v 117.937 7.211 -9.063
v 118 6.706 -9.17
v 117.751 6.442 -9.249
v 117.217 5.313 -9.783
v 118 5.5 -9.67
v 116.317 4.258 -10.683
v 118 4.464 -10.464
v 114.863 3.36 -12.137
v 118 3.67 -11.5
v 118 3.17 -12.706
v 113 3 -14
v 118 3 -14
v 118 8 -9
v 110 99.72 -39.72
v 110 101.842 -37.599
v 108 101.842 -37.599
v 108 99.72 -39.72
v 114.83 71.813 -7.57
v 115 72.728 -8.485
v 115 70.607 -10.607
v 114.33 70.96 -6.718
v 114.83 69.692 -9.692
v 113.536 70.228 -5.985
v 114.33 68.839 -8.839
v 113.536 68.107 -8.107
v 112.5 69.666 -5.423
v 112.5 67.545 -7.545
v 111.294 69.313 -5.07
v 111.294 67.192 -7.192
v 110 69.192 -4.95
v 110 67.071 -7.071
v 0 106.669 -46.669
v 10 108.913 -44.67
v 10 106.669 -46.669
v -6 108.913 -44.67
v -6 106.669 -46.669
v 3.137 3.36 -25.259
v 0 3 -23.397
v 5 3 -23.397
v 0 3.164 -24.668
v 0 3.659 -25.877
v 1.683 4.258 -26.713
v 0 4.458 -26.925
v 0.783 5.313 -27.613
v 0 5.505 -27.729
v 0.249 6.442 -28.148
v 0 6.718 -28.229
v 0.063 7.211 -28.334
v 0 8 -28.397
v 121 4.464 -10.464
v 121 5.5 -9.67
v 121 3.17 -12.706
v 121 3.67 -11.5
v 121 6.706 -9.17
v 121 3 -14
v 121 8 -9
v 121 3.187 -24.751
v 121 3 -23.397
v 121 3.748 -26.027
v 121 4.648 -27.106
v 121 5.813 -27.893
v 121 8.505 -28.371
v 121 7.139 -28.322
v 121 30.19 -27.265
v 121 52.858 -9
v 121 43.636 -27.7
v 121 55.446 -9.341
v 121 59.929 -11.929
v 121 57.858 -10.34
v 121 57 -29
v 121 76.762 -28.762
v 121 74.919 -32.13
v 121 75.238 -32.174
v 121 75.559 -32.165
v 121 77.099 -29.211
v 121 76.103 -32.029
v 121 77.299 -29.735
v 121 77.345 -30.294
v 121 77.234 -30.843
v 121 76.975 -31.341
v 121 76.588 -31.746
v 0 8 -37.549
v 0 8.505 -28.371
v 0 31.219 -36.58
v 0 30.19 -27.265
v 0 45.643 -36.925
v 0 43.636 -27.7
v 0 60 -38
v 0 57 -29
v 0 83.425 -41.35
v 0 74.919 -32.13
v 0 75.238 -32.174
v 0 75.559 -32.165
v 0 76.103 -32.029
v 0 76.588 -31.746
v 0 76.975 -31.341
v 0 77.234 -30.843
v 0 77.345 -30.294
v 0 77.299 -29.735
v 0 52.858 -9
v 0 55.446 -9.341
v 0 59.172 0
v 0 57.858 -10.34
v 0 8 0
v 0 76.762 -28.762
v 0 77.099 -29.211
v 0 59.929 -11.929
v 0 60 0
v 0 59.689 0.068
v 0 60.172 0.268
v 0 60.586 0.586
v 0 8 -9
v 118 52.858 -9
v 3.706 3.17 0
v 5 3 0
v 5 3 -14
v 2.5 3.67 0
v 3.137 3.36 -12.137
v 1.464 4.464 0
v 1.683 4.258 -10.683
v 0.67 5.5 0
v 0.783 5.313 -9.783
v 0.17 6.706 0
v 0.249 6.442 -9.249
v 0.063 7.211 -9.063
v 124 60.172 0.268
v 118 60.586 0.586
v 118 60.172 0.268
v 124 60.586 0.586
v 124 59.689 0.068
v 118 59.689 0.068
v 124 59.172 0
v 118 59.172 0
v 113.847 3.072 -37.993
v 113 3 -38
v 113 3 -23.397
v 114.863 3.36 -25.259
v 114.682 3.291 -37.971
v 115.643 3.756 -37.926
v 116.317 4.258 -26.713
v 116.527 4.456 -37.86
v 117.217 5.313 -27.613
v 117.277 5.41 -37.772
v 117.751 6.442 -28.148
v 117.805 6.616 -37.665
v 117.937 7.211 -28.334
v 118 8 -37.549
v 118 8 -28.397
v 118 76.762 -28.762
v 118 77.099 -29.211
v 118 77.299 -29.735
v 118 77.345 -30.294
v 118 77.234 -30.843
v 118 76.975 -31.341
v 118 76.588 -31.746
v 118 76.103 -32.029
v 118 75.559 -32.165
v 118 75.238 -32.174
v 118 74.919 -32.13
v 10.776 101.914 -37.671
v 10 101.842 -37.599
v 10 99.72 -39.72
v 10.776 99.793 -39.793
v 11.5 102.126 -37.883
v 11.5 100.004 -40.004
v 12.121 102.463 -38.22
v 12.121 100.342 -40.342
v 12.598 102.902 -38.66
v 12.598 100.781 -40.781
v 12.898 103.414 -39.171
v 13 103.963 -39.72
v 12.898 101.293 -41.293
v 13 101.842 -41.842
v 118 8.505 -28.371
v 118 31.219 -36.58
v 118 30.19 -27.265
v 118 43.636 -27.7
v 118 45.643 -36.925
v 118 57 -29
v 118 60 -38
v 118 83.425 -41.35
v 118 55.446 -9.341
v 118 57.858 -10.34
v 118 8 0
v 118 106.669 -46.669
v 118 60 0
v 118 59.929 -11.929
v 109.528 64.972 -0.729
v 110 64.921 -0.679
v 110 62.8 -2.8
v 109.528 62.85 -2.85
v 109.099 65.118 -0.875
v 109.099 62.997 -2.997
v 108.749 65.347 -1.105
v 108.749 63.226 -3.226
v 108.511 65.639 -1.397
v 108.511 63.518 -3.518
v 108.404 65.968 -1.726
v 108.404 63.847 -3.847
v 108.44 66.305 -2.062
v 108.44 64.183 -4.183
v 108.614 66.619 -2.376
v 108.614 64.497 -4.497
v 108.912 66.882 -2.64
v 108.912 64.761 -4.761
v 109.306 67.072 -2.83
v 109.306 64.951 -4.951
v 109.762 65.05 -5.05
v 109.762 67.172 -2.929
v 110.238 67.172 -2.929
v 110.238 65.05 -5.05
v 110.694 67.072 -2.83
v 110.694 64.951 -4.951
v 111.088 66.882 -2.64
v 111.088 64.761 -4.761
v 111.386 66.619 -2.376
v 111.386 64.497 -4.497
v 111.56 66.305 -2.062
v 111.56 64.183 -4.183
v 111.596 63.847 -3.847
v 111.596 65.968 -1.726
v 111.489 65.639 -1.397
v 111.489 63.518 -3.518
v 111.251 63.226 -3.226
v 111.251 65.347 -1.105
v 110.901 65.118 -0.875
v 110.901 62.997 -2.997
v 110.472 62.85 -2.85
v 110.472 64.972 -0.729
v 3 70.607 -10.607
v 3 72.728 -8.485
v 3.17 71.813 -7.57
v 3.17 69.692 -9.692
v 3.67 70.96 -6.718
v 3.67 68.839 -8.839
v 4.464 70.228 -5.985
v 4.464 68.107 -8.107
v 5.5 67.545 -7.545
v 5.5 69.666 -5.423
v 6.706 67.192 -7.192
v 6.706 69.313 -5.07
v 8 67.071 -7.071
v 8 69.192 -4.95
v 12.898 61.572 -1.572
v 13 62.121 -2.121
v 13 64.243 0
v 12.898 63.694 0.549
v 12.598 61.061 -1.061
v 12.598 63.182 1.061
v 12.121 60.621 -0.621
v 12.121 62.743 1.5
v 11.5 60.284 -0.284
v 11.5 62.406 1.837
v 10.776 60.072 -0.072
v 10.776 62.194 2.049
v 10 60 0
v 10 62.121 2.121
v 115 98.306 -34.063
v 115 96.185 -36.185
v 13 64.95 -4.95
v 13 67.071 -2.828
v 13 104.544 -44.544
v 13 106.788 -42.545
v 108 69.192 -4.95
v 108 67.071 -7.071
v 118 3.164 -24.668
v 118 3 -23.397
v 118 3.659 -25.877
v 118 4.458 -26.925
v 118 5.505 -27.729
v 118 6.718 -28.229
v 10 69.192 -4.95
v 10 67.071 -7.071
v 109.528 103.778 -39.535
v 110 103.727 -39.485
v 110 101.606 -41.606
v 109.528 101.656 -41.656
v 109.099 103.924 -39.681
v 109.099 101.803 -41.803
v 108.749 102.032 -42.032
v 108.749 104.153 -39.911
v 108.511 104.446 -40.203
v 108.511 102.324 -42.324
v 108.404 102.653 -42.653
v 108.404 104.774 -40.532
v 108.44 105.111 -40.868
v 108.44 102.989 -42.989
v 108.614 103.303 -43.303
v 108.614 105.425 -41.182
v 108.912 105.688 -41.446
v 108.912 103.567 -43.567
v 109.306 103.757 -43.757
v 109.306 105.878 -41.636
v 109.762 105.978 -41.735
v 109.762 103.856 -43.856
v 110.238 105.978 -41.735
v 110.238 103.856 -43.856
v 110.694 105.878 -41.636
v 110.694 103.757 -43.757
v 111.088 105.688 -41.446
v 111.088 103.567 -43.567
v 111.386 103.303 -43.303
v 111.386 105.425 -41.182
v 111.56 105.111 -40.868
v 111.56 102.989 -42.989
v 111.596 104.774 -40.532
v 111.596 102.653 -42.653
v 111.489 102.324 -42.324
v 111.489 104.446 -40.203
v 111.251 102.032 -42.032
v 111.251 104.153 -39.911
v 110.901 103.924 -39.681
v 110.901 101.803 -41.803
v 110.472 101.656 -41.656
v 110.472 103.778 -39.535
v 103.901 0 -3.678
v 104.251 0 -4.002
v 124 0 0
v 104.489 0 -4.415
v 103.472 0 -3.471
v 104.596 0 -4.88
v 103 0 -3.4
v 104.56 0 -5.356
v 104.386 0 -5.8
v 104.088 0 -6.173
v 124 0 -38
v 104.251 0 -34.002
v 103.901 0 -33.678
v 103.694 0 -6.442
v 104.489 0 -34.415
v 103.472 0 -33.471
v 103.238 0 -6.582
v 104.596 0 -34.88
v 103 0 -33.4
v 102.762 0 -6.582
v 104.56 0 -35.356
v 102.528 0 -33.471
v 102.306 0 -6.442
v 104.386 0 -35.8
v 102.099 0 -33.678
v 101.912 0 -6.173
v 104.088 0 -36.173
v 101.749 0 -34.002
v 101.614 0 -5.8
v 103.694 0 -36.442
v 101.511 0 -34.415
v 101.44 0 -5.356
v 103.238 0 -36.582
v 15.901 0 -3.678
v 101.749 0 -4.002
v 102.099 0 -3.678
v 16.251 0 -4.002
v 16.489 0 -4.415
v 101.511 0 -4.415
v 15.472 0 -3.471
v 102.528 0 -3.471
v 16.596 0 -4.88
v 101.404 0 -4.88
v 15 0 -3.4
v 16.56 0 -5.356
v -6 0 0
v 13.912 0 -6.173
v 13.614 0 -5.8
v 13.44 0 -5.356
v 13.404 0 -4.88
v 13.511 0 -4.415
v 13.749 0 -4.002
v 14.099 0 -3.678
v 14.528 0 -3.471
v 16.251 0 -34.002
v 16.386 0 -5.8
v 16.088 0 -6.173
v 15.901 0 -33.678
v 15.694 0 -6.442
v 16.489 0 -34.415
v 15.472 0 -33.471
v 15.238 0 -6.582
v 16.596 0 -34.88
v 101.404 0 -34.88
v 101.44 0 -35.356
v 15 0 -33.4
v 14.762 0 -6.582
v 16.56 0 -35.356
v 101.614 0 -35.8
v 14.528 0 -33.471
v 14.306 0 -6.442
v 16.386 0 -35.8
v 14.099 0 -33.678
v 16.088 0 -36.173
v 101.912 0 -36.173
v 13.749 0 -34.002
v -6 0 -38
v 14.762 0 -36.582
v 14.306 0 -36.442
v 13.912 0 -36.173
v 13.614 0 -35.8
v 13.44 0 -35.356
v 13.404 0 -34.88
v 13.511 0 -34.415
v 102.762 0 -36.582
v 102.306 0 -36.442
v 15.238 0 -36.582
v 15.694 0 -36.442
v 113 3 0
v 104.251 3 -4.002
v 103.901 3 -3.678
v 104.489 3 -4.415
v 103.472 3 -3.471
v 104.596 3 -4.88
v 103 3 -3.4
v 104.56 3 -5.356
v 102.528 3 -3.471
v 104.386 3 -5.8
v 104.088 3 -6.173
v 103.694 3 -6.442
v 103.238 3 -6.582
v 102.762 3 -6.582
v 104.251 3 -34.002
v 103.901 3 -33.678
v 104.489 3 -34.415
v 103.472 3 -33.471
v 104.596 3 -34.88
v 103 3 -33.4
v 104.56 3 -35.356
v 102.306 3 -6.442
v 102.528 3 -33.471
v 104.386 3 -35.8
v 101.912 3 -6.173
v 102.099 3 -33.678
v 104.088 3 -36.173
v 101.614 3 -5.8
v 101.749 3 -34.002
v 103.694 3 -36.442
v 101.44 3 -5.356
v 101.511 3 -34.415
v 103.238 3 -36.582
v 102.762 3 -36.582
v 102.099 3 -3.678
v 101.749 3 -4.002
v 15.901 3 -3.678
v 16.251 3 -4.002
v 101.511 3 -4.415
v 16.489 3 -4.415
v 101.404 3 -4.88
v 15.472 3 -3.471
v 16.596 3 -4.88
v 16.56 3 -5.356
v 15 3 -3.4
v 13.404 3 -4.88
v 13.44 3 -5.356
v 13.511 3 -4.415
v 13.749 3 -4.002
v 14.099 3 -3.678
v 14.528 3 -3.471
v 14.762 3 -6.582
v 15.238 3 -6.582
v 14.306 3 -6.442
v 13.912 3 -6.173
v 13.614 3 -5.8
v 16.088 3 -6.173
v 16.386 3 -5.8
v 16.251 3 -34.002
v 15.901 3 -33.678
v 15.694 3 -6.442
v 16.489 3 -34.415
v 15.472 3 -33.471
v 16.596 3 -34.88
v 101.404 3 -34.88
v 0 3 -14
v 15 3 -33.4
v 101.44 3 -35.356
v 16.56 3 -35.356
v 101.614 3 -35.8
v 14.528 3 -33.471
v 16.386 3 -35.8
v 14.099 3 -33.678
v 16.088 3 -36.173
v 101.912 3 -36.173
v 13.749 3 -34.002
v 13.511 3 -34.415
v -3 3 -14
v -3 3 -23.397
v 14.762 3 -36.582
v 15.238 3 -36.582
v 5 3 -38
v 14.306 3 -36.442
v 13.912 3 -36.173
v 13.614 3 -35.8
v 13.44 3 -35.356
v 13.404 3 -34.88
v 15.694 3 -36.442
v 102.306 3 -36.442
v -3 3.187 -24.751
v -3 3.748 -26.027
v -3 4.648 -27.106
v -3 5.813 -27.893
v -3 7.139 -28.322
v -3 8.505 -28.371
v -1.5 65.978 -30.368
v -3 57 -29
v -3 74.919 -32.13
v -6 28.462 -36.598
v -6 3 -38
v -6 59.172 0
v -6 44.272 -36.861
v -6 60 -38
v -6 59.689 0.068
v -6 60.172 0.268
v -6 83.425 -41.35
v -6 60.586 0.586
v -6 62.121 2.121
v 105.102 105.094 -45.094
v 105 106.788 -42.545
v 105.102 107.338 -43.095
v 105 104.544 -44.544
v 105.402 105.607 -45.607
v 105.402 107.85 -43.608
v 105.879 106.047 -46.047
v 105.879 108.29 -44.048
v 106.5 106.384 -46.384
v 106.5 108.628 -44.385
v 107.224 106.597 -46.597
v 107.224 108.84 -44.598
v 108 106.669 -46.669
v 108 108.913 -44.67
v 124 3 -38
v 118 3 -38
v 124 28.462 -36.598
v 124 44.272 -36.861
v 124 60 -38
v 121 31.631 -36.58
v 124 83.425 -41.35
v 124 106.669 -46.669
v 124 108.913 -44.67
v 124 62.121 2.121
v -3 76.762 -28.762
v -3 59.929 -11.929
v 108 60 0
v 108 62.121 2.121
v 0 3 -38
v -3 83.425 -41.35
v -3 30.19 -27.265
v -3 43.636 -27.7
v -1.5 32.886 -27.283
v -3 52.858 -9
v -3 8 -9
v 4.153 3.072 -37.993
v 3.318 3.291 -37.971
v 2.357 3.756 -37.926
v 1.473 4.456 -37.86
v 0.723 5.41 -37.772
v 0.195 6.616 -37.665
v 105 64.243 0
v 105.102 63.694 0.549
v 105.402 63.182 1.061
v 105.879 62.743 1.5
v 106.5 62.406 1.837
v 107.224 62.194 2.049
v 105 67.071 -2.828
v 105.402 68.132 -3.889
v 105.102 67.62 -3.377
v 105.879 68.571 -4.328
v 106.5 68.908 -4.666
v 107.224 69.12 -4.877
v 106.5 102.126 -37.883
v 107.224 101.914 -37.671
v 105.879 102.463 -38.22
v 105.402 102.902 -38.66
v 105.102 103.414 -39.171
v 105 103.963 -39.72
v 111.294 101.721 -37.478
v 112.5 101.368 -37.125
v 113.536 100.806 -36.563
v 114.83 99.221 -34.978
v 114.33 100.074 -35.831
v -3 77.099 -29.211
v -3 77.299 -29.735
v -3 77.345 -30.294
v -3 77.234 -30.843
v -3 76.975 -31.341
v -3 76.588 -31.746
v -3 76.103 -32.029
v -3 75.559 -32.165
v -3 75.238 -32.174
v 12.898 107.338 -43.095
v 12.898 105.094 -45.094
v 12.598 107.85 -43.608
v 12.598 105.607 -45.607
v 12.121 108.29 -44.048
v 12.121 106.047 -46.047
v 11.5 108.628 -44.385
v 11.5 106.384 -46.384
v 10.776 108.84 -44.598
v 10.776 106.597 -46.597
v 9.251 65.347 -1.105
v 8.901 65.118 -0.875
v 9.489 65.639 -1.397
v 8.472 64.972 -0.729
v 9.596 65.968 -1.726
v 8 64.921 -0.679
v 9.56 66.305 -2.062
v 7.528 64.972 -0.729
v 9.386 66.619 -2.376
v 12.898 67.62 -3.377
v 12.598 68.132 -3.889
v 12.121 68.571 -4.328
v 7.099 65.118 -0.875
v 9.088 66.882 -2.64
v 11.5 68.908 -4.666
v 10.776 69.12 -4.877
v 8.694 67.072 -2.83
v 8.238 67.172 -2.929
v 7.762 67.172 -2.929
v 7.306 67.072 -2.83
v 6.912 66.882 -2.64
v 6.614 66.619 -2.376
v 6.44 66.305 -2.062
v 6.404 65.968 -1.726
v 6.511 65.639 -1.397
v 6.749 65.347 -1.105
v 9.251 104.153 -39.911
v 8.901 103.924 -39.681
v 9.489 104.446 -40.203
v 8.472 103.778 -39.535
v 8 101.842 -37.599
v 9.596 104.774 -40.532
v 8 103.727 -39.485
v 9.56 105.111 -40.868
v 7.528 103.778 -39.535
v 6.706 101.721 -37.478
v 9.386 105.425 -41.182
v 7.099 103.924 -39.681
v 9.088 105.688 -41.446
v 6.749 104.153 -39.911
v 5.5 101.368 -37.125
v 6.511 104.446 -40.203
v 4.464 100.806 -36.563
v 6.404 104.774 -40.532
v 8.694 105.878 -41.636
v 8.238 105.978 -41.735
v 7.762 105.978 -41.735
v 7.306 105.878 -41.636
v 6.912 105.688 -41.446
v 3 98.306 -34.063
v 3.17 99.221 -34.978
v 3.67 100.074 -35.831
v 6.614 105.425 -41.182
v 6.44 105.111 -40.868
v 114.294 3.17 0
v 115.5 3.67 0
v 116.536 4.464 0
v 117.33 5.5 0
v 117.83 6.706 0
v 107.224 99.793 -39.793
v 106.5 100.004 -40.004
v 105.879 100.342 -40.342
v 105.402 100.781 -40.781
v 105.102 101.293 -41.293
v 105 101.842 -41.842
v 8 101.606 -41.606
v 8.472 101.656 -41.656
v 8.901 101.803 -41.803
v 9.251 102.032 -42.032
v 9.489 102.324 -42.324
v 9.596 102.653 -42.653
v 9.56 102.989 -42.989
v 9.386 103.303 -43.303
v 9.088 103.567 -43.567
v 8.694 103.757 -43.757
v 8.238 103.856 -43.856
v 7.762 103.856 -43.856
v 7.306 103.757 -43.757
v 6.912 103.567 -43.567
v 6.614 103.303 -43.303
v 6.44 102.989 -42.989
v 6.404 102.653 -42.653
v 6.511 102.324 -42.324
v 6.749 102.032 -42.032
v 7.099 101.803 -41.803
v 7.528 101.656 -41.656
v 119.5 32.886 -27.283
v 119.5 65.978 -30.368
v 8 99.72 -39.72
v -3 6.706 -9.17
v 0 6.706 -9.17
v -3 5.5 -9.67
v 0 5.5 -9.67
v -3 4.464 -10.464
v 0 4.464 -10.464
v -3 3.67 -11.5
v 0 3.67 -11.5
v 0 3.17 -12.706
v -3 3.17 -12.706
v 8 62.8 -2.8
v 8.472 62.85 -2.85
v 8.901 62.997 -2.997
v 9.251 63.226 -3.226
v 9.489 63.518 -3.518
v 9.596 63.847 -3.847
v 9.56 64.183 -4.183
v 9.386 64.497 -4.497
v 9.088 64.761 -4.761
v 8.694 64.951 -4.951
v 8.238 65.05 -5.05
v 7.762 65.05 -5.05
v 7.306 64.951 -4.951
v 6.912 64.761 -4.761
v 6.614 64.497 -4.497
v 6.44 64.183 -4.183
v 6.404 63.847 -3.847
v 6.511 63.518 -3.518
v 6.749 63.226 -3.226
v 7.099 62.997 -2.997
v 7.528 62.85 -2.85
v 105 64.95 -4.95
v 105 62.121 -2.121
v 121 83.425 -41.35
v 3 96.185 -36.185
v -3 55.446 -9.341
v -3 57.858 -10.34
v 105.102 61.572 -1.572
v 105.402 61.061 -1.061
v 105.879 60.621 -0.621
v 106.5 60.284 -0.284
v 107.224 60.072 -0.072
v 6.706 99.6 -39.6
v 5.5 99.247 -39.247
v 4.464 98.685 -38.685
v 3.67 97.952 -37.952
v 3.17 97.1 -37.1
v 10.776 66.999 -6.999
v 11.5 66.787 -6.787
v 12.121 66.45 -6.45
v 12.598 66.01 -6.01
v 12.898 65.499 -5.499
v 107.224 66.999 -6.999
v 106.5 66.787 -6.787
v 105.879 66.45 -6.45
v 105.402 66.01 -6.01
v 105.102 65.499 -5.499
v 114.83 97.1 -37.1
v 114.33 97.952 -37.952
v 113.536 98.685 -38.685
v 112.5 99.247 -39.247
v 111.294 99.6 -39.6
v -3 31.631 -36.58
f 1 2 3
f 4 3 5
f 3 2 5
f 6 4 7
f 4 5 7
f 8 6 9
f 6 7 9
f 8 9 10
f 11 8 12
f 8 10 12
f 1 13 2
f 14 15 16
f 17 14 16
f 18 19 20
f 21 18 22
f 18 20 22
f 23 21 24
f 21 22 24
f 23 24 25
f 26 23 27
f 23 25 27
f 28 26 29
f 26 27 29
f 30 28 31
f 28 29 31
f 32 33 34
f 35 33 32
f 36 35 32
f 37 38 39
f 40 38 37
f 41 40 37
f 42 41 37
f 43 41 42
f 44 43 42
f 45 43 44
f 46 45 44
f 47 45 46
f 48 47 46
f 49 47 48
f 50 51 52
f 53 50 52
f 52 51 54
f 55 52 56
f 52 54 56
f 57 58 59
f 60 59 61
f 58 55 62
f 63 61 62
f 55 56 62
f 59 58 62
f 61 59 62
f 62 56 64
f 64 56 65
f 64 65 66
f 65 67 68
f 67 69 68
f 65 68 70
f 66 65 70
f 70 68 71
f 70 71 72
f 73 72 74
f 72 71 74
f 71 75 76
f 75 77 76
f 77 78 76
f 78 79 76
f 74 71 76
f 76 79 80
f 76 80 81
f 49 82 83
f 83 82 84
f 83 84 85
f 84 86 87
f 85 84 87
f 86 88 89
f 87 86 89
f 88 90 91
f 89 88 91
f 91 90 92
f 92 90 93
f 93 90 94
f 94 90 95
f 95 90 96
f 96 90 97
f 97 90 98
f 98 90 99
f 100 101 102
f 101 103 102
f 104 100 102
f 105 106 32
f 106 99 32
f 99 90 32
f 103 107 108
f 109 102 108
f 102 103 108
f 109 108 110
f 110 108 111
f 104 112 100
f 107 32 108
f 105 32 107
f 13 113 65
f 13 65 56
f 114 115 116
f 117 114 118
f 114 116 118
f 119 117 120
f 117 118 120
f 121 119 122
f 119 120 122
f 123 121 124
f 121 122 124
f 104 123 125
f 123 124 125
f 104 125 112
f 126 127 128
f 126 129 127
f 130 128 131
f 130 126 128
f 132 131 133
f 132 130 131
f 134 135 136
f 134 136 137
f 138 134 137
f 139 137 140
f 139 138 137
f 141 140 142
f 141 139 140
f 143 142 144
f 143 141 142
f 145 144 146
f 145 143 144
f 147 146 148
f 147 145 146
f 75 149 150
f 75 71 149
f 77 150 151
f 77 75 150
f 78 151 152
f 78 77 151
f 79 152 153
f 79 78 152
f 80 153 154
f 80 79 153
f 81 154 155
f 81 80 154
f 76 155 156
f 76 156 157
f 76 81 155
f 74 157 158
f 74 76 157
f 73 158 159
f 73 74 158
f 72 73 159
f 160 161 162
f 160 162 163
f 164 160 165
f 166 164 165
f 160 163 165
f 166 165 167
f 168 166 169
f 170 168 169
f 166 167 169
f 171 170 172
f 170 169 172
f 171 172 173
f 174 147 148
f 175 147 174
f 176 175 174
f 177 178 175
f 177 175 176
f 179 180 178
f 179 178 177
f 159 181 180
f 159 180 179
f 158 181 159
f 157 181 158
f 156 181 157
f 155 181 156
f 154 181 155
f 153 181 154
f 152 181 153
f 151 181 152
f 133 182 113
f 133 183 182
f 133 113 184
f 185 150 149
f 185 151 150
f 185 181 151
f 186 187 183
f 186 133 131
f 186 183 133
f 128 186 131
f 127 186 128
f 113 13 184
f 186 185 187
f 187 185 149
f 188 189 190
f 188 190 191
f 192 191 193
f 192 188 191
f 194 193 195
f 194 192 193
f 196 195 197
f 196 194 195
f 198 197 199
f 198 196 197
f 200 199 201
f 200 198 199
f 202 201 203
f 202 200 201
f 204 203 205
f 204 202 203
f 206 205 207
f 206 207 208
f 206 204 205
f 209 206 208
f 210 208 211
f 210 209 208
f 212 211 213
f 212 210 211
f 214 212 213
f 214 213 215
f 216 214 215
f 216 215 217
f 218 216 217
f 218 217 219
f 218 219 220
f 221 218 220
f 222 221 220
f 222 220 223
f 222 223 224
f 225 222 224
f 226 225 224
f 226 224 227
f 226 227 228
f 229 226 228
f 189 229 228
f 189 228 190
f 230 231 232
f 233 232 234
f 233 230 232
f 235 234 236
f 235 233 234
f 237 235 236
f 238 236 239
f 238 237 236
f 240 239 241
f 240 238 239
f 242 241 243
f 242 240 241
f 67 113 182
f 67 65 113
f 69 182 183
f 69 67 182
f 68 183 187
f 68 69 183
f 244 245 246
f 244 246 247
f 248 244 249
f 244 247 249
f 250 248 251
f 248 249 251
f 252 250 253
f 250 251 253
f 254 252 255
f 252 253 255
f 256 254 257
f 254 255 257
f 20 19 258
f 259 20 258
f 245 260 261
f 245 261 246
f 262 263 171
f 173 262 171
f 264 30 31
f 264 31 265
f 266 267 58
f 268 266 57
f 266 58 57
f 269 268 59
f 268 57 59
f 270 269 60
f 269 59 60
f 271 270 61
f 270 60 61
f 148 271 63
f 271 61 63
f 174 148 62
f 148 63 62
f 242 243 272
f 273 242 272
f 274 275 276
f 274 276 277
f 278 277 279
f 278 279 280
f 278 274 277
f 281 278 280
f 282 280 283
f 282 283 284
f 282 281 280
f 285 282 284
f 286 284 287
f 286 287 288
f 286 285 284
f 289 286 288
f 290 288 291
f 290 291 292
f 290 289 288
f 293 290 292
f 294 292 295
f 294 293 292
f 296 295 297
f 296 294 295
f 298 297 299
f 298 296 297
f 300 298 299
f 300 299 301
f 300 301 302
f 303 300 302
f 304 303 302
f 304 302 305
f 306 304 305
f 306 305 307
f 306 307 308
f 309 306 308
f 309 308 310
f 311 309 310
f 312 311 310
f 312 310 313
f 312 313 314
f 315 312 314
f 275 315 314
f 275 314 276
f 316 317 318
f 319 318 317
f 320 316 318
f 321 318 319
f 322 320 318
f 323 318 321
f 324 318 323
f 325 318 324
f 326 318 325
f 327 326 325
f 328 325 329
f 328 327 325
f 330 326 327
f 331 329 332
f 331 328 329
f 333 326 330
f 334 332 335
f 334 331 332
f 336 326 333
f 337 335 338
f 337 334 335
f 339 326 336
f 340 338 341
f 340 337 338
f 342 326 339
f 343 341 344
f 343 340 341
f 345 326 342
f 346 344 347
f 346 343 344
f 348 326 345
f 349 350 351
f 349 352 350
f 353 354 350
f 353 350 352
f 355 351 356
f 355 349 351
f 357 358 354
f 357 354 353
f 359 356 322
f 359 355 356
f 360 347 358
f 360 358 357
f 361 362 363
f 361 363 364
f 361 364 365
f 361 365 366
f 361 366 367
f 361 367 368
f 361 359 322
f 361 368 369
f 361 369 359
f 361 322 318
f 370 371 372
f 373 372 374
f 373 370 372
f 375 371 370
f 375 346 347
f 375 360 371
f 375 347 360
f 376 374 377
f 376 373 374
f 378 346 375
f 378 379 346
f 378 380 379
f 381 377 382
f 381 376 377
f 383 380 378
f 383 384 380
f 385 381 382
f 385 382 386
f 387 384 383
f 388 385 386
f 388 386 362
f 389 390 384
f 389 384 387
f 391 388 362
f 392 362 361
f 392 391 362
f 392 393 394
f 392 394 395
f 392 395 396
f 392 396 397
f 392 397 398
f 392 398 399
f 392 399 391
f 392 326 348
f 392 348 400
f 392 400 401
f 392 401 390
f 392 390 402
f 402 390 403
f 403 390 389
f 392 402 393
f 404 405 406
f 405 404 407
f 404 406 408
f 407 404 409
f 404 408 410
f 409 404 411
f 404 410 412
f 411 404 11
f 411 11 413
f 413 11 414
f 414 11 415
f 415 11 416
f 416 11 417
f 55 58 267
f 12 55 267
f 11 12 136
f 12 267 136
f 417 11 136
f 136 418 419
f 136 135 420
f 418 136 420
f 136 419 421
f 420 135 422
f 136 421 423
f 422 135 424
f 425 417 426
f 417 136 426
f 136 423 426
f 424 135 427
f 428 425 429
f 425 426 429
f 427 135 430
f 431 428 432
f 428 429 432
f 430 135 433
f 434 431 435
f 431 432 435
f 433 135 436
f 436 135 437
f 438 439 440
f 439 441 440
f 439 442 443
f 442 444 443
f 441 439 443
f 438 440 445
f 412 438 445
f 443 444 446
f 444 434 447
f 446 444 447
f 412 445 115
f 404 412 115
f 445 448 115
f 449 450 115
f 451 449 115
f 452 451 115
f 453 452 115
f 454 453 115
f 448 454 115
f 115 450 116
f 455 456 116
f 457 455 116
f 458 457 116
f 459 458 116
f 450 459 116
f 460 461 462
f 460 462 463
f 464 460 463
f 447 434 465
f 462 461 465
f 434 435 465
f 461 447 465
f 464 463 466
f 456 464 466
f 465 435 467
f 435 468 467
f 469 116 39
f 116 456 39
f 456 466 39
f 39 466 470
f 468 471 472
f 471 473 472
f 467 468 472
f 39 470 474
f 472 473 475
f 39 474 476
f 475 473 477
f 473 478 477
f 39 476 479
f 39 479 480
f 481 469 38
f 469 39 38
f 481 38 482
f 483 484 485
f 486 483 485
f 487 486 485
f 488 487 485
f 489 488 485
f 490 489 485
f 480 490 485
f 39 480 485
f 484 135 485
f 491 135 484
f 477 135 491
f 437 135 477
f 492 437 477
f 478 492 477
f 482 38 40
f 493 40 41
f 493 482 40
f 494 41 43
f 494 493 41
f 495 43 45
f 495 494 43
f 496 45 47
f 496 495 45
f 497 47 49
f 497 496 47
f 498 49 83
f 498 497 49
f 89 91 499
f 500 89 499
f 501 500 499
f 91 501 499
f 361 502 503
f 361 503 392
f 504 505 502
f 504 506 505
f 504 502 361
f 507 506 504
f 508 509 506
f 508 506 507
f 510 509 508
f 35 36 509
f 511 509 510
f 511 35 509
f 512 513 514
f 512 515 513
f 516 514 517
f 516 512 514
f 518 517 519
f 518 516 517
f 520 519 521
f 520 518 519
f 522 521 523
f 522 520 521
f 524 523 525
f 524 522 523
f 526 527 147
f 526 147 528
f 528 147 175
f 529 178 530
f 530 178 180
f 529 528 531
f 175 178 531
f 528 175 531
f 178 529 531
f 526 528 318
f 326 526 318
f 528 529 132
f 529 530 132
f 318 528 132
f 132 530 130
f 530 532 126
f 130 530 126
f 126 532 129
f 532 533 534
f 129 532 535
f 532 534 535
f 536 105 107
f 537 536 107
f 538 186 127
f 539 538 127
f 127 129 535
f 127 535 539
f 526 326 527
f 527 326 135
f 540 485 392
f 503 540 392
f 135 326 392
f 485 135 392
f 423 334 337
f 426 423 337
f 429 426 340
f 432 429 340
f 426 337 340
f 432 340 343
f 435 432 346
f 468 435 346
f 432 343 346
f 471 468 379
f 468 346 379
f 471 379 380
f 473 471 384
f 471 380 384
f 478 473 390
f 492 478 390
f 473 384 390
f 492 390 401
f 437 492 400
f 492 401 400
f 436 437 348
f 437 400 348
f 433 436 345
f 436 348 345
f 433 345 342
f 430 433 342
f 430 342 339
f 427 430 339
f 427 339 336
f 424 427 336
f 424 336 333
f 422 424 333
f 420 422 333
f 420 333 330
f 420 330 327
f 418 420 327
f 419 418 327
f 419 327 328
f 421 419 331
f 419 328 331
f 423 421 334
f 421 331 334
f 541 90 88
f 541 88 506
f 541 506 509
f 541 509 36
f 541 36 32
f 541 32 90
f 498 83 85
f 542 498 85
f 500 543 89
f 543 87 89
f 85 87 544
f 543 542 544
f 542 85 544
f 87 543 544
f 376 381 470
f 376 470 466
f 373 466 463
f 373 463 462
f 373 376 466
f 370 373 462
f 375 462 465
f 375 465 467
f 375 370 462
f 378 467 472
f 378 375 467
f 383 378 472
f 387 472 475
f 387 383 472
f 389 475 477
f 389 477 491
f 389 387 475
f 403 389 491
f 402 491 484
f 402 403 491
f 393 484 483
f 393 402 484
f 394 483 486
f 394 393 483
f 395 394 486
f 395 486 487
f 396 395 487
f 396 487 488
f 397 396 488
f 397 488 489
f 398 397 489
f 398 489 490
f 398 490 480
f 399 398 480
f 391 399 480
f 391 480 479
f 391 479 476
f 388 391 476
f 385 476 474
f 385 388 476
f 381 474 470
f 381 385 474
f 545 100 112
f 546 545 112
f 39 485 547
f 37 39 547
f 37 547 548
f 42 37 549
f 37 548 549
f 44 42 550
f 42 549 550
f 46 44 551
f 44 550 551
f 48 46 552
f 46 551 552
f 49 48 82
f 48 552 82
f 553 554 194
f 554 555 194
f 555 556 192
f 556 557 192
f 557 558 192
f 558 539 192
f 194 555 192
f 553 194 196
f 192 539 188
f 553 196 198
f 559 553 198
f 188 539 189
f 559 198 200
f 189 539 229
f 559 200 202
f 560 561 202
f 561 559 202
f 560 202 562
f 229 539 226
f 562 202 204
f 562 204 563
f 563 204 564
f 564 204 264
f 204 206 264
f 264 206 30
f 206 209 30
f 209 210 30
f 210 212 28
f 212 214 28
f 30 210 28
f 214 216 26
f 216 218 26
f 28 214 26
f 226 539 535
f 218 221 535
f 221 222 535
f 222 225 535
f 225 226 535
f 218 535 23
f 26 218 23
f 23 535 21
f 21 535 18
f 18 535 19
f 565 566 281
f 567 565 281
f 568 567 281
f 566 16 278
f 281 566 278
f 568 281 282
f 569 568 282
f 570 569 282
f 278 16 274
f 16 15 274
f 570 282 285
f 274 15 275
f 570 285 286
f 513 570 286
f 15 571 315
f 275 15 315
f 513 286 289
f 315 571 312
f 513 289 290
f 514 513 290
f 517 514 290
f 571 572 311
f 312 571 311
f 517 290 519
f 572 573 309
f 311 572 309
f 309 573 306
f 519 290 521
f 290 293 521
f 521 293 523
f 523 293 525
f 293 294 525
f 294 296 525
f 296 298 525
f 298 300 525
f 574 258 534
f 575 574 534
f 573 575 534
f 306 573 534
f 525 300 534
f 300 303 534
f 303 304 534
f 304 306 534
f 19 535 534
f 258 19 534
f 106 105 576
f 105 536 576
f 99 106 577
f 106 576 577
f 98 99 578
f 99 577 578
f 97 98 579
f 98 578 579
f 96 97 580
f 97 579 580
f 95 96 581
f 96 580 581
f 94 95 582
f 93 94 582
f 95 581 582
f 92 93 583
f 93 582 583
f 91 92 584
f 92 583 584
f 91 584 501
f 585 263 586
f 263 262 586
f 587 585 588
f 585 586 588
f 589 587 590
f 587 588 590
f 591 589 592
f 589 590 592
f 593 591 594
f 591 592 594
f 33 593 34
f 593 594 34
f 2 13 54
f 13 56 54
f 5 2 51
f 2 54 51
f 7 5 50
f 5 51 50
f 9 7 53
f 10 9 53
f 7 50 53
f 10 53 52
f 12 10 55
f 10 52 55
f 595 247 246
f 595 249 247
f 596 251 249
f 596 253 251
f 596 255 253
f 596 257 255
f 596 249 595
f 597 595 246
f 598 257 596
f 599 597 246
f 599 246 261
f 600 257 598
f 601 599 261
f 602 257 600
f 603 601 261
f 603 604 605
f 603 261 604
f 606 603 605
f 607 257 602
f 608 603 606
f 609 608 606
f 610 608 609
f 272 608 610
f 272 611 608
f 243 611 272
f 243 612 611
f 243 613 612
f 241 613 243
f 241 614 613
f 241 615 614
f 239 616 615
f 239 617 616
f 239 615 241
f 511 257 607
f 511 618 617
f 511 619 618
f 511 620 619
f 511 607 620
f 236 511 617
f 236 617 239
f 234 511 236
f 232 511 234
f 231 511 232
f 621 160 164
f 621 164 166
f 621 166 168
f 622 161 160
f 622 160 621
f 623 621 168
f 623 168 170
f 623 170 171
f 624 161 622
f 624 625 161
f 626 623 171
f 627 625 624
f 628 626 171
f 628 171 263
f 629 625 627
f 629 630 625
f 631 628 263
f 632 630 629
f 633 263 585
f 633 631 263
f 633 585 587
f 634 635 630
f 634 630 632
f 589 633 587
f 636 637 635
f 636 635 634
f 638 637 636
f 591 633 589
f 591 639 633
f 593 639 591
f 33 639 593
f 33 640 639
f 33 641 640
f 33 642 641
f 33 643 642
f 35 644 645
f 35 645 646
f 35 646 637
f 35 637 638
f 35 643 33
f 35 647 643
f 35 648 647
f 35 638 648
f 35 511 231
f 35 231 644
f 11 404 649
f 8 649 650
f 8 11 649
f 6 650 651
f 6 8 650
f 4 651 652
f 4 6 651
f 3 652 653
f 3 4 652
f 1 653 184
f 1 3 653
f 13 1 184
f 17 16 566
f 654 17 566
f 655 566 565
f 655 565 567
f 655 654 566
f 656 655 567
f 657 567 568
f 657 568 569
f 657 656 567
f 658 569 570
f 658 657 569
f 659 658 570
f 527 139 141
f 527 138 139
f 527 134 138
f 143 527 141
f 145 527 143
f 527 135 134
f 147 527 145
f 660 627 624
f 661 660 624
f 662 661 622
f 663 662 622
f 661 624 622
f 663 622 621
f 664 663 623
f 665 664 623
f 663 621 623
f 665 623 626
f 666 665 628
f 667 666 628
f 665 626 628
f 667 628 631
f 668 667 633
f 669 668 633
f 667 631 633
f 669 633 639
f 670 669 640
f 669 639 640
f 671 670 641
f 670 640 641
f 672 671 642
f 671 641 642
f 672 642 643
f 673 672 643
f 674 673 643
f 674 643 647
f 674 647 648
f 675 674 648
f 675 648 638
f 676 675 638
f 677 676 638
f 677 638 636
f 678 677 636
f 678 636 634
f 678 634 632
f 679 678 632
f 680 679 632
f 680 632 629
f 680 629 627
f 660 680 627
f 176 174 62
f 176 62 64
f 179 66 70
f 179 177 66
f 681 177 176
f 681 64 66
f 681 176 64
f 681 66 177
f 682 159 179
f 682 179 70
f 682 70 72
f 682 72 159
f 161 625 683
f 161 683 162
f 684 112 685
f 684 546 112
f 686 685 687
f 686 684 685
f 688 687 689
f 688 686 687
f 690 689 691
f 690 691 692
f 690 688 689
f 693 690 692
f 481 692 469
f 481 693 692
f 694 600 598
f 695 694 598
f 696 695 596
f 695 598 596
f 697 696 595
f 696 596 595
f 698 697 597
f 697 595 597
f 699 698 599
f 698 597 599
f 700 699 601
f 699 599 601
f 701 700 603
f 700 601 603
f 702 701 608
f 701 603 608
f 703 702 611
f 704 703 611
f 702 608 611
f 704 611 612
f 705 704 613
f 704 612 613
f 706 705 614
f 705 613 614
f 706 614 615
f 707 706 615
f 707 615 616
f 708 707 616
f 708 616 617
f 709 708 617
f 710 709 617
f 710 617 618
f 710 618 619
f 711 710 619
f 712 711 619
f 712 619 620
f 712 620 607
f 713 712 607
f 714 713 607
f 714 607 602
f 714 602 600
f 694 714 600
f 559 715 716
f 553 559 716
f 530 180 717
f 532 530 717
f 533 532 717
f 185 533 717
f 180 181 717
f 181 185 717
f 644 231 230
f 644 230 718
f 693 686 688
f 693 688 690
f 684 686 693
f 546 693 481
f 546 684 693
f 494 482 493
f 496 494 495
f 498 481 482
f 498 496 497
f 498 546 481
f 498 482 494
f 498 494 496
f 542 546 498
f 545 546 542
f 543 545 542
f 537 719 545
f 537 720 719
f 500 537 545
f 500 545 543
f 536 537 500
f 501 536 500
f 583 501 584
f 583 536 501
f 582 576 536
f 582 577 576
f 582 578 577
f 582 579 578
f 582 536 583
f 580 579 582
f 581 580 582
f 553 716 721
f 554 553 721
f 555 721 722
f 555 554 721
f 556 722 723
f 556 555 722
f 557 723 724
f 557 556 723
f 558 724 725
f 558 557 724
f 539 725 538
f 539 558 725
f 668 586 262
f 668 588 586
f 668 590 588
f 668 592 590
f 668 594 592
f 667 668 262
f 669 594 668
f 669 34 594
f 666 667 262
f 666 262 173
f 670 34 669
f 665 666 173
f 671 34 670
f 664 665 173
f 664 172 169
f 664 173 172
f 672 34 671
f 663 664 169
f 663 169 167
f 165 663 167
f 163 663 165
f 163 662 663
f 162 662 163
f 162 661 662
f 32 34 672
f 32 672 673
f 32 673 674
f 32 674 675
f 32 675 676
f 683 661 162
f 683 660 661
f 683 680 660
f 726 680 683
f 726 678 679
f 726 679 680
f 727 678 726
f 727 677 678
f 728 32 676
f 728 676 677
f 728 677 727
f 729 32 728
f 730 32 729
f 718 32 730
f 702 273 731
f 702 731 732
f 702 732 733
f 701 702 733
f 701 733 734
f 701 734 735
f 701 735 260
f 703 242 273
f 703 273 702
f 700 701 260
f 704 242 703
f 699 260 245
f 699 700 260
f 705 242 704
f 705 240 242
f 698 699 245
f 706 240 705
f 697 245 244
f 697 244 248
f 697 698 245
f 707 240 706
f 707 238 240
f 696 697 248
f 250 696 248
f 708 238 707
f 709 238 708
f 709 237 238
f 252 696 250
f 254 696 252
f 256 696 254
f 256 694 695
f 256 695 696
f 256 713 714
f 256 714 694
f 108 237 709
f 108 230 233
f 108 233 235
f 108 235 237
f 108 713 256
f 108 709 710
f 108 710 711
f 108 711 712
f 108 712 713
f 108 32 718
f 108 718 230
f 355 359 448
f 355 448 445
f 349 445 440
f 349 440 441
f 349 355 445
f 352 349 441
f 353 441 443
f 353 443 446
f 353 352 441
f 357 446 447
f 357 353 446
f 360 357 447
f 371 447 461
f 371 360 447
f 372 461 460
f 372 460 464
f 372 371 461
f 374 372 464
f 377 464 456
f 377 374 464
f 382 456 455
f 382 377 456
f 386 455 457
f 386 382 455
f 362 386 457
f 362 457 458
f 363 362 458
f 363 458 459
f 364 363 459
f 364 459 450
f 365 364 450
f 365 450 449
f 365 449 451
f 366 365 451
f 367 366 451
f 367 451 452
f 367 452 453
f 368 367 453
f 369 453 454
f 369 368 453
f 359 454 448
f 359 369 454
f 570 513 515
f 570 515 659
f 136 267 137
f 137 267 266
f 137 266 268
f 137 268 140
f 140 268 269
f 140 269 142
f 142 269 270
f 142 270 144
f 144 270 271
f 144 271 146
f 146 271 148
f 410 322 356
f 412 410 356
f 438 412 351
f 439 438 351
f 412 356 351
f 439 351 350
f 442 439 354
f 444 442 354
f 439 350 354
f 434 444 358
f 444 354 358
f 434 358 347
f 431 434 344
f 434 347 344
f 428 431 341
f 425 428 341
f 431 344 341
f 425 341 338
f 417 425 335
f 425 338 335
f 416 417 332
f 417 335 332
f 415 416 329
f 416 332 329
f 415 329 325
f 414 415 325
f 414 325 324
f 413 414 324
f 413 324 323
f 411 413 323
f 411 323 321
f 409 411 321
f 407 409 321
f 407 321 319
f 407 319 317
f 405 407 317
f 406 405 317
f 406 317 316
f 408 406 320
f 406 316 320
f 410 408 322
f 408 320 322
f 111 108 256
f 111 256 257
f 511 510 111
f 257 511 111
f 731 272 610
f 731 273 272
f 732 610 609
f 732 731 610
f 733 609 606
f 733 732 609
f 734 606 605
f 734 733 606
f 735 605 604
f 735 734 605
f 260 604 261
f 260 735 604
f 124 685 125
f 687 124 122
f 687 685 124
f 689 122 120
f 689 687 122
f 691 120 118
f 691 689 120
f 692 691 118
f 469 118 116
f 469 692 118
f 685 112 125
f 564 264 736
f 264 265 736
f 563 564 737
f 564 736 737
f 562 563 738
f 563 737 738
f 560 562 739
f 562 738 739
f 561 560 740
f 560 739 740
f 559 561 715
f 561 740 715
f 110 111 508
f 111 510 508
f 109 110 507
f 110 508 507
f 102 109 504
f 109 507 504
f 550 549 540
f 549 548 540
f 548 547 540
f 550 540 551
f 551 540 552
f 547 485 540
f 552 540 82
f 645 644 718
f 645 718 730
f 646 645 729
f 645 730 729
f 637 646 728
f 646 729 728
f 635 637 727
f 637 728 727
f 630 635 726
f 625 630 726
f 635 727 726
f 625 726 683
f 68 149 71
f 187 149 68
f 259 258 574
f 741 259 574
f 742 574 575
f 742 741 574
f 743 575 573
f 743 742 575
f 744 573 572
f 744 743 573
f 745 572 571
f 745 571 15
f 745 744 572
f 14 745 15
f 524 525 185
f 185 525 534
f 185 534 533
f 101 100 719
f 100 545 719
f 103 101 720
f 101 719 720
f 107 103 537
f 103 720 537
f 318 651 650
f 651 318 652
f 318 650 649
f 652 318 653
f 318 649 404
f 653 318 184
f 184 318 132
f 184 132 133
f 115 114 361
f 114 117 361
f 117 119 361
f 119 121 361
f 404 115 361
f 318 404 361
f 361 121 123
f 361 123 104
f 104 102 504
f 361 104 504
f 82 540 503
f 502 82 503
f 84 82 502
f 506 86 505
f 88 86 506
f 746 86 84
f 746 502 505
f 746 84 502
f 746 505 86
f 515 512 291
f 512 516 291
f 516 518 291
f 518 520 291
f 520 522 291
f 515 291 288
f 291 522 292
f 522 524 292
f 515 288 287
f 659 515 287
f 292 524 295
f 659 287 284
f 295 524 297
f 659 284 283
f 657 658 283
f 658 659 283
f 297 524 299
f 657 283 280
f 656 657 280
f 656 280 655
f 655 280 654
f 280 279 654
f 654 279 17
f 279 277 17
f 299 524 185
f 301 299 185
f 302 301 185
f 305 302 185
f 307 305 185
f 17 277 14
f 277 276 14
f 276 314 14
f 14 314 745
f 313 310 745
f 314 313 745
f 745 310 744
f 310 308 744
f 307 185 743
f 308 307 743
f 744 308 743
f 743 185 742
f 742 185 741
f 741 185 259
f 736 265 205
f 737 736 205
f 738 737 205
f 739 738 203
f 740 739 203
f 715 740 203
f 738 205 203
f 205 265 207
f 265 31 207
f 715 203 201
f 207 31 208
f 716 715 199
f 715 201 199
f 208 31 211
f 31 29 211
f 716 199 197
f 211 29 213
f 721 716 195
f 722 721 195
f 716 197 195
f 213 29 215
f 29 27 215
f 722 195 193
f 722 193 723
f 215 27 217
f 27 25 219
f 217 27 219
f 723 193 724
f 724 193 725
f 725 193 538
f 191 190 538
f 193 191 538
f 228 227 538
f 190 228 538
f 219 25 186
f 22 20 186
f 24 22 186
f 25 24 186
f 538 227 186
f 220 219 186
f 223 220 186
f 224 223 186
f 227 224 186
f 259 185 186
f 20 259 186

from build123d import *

# Parameters (mm, degrees)
SKETCH_1_W          = 20
SKETCH_1_H          = 38
SKETCH_1_R          = 1.6
EXTRUDE_1_DEPTH     = 3
SKETCH_7_W          = 38
SKETCH_7_H          = 3
EXTRUDE_7_DEPTH     = 6
EXTRUDE_8_DEPTH     = 19
FILLET_1_R          = 2
SKETCH_10_R         = 1.6
CUT_EXTRUDE_3_DEPTH = 10
CUT_EXTRUDE_4_DEPTH = 3
SKETCH_13_W         = 10
SKETCH_13_H         = 46.172897719
CUT_EXTRUDE_5_DEPTH = 3
FILLET_3_R          = 10
FILLET_4_R          = 5
FILLET_5_R          = 2
FILLET_6_R          = 5
FILLET_7_R          = 5
FILLET_8_R          = 3
SKETCH_11_W         = 39
SKETCH_11_H         = 38
EXTRUDE_9_DEPTH     = 3
FILLET_START        = -37.531780157
FILLET_9_DEPTH      = 9.135274029
FILLET_START_2      = -9
FILLET_9_2_DEPTH    = 9
FILLET_START_3      = -38.0000001
FILLET_9_3_DEPTH    = 14.603493972
FILLET_START_4      = -14
FILLET_9_4_DEPTH    = 5
FILLET_9_5_DEPTH    = 5


with BuildPart() as part:
    # 草图1 → 凸台-拉伸1 (new body)
    with BuildSketch(Plane(origin=(0, 0, 0), x_dir=(1, 0, 0), z_dir=(0, 1, 0))):
        with Locations((10, 19)):
            Rectangle(SKETCH_1_W, SKETCH_1_H)
        with Locations(Location((15, 5, 0), (0, 0, 270))):
            Circle(SKETCH_1_R, mode=Mode.SUBTRACT)
        with Locations(Location((15, 35, 0), (0, 0, 270))):
            Circle(SKETCH_1_R, mode=Mode.SUBTRACT)
    extrude(amount=EXTRUDE_1_DEPTH)

    # 草图7 → 凸台-拉伸7 (add)
    with BuildSketch(Plane.ZY):
        with BuildLine():
            Line((-38, 3), (0, 3))
            Line((0, 3), (0, 60))
            Line((0, 60), (-38, 60))
            add(Edge.make_bspline(
                [(-38, 3), (-35.160021148, 31.761534368), (-38, 60)],
                knots=[0, 0, 0, 0.545624852, 0.545624852, 0.545624852], degree=2))
        make_face()
        with Locations((-19, 1.5)):
            Rectangle(SKETCH_7_W, SKETCH_7_H)
        with BuildLine():
            Line((-38, 60), (0, 60))
            Line((0, 60), (2.121320344, 62.121320344))
            Line((2.121320344, 62.121320344), (-44.669984364, 108.912625051))
            Line((-44.669984364, 108.912625051), (-46.669047558, 106.669047558))
            add(Edge.make_bspline(
                [(-38, 60), (-40.365023894, 83.51589552), (-46.669047558, 106.669047558)],
                knots=[0.545624852, 0.545624852, 0.545624852, 1, 1, 1], degree=2))
        make_face()
    extrude(amount=EXTRUDE_7_DEPTH)

    # 草图8 → 凸台-拉伸8 (add)
    with BuildSketch(Plane.ZY.offset(6)):
        Polygon((-44.669984364, 108.912625051), (-46.669047558, 106.669047558), (0, 60), (2.121320344, 62.121320344), align=None)
    extrude(amount=-EXTRUDE_8_DEPTH)

    # 圆角1
    fillet_1_edges = [part.edges().sort_by_distance(p)[0] for p in [
        (-3, 60, 0),
    ]]
    fillet(fillet_1_edges, radius=FILLET_1_R)

    # 草图10 → 切除-拉伸3 (cut)
    with BuildSketch(Plane(origin=(0, 32.121320344, 32.121320344), x_dir=(1, 0, 0), z_dir=(0, 0.7071067811865476, 0.7071067811865475))):
        with Locations(Location((8, 102.866406871, 0), (0, 0, 270))):
            Circle(SKETCH_10_R)
        with Locations(Location((8, 47.986406871, 0), (0, 0, 270))):
            Circle(SKETCH_10_R)
    extrude(amount=-CUT_EXTRUDE_3_DEPTH, mode=Mode.SUBTRACT)

    # 草图12 → 切除-拉伸4 (cut)
    with BuildSketch(Plane(origin=(0, 0, 0), x_dir=(0, 0, -1), z_dir=(1, 0, 0))):
        with BuildLine():
            Line((9, 57), (9, 3))
            Line((9, 3), (29, 3))
            add(Edge.make_bspline(
                [(29, 3), (25.530992691, 30.329804849), (29, 57)],
                knots=[0, 0, 0, 0.681816387, 0.681816387, 0.681816387], degree=2))
            Line((29, 57), (9, 57))
        make_face()
        with BuildLine():
            Line((33.748737342, 81.748737342), (9, 57))
            Line((9, 57), (29, 57))
            add(Edge.make_bspline(
                [(29, 57), (30.618883469, 69.446194026), (33.748737342, 81.748737342)],
                knots=[0.681816387, 0.681816387, 0.681816387, 1, 1, 1], degree=2))
        make_face()
    extrude(amount=-CUT_EXTRUDE_4_DEPTH, mode=Mode.SUBTRACT)

    # 草图13 → 切除-拉伸5 (cut)
    with BuildSketch(Plane(origin=(0, 32.121320344, 32.121320344), x_dir=(1, 0, 0), z_dir=(0, 0.7071067811865476, 0.7071067811865475))):
        with Locations((8, 75.512855731)):
            Rectangle(SKETCH_13_W, SKETCH_13_H)
    extrude(amount=-CUT_EXTRUDE_5_DEPTH, mode=Mode.SUBTRACT)

    # 圆角3
    fillet_3_edges = [part.edges().sort_by_distance(p)[0] for p in [
        (-1.5, 57, -9),
    ]]
    fillet(fillet_3_edges, radius=FILLET_3_R)

    # 圆角4
    fillet_4_edges = [part.edges().sort_by_distance(p)[0] for p in [
        (-1.5, 3, -29),
        (-1.5, 3, -9),
    ]]
    fillet(fillet_4_edges, radius=FILLET_4_R)

    # 圆角5
    fillet_5_edges = [part.edges().sort_by_distance(p)[0] for p in [
        (-1.5, 81.748737342, -33.748737342),
    ]]
    fillet(fillet_5_edges, radius=FILLET_5_R)

    # 圆角6
    fillet_6_edges = [part.edges().sort_by_distance(p)[0] for p in [
        (3, 100.780897067, -38.659576724),
    ]]
    fillet(fillet_6_edges, radius=FILLET_6_R)

    # 圆角7
    fillet_7_edges = [part.edges().sort_by_distance(p)[0] for p in [
        (3, 68.131727984, -6.01040764),
    ]]
    fillet(fillet_7_edges, radius=FILLET_7_R)

    # 圆角8
    fillet_8_edges = [part.edges().sort_by_distance(p)[0] for p in [
        (13, 61.060660172, 1.060660172),
        (13, 107.790836305, -45.669515961),
        (13, 100.780897067, -38.659576724),
        (13, 68.131727984, -6.01040764),
    ]]
    fillet(fillet_8_edges, radius=FILLET_8_R)

    # 草图11 → 凸台-拉伸9 (add)
    with BuildSketch(Plane(origin=(0, 0, 0), x_dir=(1, 0, 0), z_dir=(0, 1, 0))):
        with Locations((39.5, 19)):
            Rectangle(SKETCH_11_W, SKETCH_11_H)
    extrude(amount=EXTRUDE_9_DEPTH)

    # 圆角9: read off the stored shape, not the designer's step
    # 圆角9 outline → 圆角9 (add)
    with BuildSketch(Plane.XY.offset(FILLET_START)):
        with BuildLine():
            Line((0, 3), (5, 3))
            ThreePointArc((5, 3), (1.464466094, 4.464466094), (0, 8))
            Line((0, 8), (0, 3))
        make_face()
    extrude(amount=FILLET_9_DEPTH)

    # Fillet 9 2 outline → Fillet 9 2 (add)
    with BuildSketch(Plane.XY.offset(FILLET_START_2)):
        with BuildLine():
            Line((0, 3), (5, 3))
            ThreePointArc((5, 3), (1.464466094, 4.464466094), (0, 8))
            Line((0, 8), (0, 3))
        make_face()
    extrude(amount=FILLET_9_2_DEPTH)

    # Fillet 9 3 outline → Fillet 9 3 (add)
    with BuildSketch(Plane.XY.offset(FILLET_START_3)):
        with BuildLine():
            Line((0, 3), (5, 3))
            ThreePointArc((5, 3), (1.464466094, 4.464466094), (0, 8))
            Line((0, 8), (0, 3))
        make_face()
    extrude(amount=FILLET_9_3_DEPTH)

    # Fillet 9 4 outline → Fillet 9 4 (add)
    with BuildSketch(Plane.XY.offset(FILLET_START_4)):
        with BuildLine():
            Line((0, 3), (5, 3))
            ThreePointArc((5, 3), (1.464466094, 4.464466094), (0, 8))
            Line((0, 8), (0, 3))
        make_face()
    extrude(amount=FILLET_9_4_DEPTH)

    # Fillet 9 5 outline → Fillet 9 5 (cut)
    with BuildSketch(Plane.YZ):
        with BuildLine():
            Line((3, -14), (8, -14))
            Line((8, -14), (8, -9))
            ThreePointArc((8, -9), (4.464466094, -10.464466094), (3, -14))
        make_face()
        with BuildLine():
            Line((8, -38.0000001), (8, -37.548880036))
            add(Edge.make_bspline(
                [(3, -38), (5.50197912, -37.752948932), (8, -37.548880036)],
                knots=[0, 0, 0, 0.047464157, 0.047464157, 0.047464157], degree=2))
            Line((3, -38), (8, -38.0000001))
        make_face()
        with BuildLine():
            ThreePointArc((3, -23.396506128), (4.464466094, -26.932040034), (8, -28.396506128))
            Line((8, -28.396506128), (8, -23.396506128))
            Line((8, -23.396506128), (3, -23.396506128))
        make_face()
    extrude(amount=FILLET_9_5_DEPTH, mode=Mode.SUBTRACT)

    # 镜向6: part across plane


with BuildPart() as part_1:
    add(part.part)
    add(part.part.mirror(Plane(origin=(59, 0, 0), x_dir=(0, 0, 1), z_dir=(1, 0, 0))))


solid = part_1.part
